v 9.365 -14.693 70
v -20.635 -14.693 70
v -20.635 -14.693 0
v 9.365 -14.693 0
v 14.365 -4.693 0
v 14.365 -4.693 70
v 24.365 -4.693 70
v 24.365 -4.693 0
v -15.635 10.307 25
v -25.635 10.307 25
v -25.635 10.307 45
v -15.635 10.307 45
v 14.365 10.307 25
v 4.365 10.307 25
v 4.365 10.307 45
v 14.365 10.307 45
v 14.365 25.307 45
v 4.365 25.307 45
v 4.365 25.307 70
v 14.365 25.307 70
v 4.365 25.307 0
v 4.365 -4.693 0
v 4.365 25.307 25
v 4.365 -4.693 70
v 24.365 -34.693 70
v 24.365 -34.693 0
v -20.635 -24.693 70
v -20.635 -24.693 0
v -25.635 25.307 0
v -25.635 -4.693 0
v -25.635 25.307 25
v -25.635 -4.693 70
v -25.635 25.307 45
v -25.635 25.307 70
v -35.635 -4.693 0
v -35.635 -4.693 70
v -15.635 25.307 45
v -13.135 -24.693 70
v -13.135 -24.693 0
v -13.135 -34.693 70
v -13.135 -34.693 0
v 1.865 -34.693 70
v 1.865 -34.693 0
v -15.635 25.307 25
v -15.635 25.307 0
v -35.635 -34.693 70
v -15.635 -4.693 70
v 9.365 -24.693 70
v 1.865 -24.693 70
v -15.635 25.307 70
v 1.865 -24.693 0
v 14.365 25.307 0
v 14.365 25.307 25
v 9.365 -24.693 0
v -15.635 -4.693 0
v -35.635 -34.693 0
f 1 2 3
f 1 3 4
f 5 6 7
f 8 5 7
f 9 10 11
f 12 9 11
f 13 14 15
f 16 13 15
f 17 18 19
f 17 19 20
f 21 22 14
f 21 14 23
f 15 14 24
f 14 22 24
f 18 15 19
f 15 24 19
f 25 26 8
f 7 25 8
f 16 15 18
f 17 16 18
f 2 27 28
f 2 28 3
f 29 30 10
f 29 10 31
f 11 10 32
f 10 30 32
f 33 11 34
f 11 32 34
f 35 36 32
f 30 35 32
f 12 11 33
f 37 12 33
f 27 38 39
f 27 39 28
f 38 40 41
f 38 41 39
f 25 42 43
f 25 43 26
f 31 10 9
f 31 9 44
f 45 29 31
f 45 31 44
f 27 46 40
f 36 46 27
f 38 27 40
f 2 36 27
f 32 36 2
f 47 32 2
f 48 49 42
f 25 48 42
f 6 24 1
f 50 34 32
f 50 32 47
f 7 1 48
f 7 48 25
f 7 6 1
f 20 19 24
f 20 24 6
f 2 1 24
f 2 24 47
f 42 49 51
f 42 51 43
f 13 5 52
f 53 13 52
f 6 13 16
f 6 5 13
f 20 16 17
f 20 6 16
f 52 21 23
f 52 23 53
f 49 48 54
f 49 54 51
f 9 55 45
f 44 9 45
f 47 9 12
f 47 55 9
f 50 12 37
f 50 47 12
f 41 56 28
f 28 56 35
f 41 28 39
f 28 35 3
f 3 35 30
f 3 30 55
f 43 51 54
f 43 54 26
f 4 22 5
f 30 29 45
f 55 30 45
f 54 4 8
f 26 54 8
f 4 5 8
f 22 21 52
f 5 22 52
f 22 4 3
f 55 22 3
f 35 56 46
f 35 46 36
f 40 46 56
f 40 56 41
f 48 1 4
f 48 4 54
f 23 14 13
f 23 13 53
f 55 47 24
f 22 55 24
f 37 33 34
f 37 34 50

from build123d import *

# Parameters (mm, degrees)
IZIM1_W                     = 60
IZIM1_H                     = 60
Y_KSEKLIK_EKSTR_ZYON1_DEPTH = 70
KES_EKSTR_ZYON1_DEPTH       = 70
IZIM3_W                     = 10
IZIM3_H                     = 30
KES_EKSTR_ZYON2_DEPTH       = 70
IZIM4_W                     = 20
IZIM4_H                     = 30
KES_EKSTR_ZYON5_DEPTH       = 70
IZIM5_W                     = 20
IZIM5_H                     = 15
KES_EKSTR_ZYON6_DEPTH       = 40


with BuildPart() as part:
    # Çizim1 → Yükseklik-Ekstrüzyon1 (new body)
    with BuildSketch(Plane.XY):
        with Locations((-5.635360797, -4.69273743)):
            Rectangle(IZIM1_W, IZIM1_H)
    extrude(amount=Y_KSEKLIK_EKSTR_ZYON1_DEPTH)

    # Çizim2 → Kes-Ekstrüzyon1 (cut)
    with BuildSketch(Plane.XY.offset(70)):
        Polygon((9.364639203, -24.69273743), (1.864639203, -24.69273743), (1.864639203, -34.69273743), (-5.635360797, -34.69273743), (-13.135360797, -34.69273743), (-13.135360797, -24.69273743), (-20.635360797, -24.69273743), (-20.635360797, -14.69273743), (9.364639203, -14.69273743), align=None)
    extrude(amount=-KES_EKSTR_ZYON1_DEPTH, mode=Mode.SUBTRACT)

    # Çizim3 → Kes-Ekstrüzyon2 (cut)
    with BuildSketch(Plane.XY.offset(70)):
        with Locations((19.364639203, 10.30726257)):
            Rectangle(IZIM3_W, IZIM3_H)
        with Locations((-30.635360797, 10.30726257)):
            Rectangle(IZIM3_W, IZIM3_H)
    extrude(amount=-KES_EKSTR_ZYON2_DEPTH, mode=Mode.SUBTRACT)

    # Çizim4 → Kes-Ekstrüzyon5 (cut)
    with BuildSketch(Plane.XY.offset(70)):
        with Locations((-5.635360797, 10.30726257)):
            Rectangle(IZIM4_W, IZIM4_H)
    extrude(amount=-KES_EKSTR_ZYON5_DEPTH, mode=Mode.SUBTRACT)

    # Çizim5 → Kes-Ekstrüzyon6 (cut)
    with BuildSketch(Plane.ZY.offset(25.635360797)):
        with Locations((35, 17.80726257)):
            Rectangle(IZIM5_W, IZIM5_H)
    extrude(amount=-KES_EKSTR_ZYON6_DEPTH, mode=Mode.SUBTRACT)


solid = part.part
